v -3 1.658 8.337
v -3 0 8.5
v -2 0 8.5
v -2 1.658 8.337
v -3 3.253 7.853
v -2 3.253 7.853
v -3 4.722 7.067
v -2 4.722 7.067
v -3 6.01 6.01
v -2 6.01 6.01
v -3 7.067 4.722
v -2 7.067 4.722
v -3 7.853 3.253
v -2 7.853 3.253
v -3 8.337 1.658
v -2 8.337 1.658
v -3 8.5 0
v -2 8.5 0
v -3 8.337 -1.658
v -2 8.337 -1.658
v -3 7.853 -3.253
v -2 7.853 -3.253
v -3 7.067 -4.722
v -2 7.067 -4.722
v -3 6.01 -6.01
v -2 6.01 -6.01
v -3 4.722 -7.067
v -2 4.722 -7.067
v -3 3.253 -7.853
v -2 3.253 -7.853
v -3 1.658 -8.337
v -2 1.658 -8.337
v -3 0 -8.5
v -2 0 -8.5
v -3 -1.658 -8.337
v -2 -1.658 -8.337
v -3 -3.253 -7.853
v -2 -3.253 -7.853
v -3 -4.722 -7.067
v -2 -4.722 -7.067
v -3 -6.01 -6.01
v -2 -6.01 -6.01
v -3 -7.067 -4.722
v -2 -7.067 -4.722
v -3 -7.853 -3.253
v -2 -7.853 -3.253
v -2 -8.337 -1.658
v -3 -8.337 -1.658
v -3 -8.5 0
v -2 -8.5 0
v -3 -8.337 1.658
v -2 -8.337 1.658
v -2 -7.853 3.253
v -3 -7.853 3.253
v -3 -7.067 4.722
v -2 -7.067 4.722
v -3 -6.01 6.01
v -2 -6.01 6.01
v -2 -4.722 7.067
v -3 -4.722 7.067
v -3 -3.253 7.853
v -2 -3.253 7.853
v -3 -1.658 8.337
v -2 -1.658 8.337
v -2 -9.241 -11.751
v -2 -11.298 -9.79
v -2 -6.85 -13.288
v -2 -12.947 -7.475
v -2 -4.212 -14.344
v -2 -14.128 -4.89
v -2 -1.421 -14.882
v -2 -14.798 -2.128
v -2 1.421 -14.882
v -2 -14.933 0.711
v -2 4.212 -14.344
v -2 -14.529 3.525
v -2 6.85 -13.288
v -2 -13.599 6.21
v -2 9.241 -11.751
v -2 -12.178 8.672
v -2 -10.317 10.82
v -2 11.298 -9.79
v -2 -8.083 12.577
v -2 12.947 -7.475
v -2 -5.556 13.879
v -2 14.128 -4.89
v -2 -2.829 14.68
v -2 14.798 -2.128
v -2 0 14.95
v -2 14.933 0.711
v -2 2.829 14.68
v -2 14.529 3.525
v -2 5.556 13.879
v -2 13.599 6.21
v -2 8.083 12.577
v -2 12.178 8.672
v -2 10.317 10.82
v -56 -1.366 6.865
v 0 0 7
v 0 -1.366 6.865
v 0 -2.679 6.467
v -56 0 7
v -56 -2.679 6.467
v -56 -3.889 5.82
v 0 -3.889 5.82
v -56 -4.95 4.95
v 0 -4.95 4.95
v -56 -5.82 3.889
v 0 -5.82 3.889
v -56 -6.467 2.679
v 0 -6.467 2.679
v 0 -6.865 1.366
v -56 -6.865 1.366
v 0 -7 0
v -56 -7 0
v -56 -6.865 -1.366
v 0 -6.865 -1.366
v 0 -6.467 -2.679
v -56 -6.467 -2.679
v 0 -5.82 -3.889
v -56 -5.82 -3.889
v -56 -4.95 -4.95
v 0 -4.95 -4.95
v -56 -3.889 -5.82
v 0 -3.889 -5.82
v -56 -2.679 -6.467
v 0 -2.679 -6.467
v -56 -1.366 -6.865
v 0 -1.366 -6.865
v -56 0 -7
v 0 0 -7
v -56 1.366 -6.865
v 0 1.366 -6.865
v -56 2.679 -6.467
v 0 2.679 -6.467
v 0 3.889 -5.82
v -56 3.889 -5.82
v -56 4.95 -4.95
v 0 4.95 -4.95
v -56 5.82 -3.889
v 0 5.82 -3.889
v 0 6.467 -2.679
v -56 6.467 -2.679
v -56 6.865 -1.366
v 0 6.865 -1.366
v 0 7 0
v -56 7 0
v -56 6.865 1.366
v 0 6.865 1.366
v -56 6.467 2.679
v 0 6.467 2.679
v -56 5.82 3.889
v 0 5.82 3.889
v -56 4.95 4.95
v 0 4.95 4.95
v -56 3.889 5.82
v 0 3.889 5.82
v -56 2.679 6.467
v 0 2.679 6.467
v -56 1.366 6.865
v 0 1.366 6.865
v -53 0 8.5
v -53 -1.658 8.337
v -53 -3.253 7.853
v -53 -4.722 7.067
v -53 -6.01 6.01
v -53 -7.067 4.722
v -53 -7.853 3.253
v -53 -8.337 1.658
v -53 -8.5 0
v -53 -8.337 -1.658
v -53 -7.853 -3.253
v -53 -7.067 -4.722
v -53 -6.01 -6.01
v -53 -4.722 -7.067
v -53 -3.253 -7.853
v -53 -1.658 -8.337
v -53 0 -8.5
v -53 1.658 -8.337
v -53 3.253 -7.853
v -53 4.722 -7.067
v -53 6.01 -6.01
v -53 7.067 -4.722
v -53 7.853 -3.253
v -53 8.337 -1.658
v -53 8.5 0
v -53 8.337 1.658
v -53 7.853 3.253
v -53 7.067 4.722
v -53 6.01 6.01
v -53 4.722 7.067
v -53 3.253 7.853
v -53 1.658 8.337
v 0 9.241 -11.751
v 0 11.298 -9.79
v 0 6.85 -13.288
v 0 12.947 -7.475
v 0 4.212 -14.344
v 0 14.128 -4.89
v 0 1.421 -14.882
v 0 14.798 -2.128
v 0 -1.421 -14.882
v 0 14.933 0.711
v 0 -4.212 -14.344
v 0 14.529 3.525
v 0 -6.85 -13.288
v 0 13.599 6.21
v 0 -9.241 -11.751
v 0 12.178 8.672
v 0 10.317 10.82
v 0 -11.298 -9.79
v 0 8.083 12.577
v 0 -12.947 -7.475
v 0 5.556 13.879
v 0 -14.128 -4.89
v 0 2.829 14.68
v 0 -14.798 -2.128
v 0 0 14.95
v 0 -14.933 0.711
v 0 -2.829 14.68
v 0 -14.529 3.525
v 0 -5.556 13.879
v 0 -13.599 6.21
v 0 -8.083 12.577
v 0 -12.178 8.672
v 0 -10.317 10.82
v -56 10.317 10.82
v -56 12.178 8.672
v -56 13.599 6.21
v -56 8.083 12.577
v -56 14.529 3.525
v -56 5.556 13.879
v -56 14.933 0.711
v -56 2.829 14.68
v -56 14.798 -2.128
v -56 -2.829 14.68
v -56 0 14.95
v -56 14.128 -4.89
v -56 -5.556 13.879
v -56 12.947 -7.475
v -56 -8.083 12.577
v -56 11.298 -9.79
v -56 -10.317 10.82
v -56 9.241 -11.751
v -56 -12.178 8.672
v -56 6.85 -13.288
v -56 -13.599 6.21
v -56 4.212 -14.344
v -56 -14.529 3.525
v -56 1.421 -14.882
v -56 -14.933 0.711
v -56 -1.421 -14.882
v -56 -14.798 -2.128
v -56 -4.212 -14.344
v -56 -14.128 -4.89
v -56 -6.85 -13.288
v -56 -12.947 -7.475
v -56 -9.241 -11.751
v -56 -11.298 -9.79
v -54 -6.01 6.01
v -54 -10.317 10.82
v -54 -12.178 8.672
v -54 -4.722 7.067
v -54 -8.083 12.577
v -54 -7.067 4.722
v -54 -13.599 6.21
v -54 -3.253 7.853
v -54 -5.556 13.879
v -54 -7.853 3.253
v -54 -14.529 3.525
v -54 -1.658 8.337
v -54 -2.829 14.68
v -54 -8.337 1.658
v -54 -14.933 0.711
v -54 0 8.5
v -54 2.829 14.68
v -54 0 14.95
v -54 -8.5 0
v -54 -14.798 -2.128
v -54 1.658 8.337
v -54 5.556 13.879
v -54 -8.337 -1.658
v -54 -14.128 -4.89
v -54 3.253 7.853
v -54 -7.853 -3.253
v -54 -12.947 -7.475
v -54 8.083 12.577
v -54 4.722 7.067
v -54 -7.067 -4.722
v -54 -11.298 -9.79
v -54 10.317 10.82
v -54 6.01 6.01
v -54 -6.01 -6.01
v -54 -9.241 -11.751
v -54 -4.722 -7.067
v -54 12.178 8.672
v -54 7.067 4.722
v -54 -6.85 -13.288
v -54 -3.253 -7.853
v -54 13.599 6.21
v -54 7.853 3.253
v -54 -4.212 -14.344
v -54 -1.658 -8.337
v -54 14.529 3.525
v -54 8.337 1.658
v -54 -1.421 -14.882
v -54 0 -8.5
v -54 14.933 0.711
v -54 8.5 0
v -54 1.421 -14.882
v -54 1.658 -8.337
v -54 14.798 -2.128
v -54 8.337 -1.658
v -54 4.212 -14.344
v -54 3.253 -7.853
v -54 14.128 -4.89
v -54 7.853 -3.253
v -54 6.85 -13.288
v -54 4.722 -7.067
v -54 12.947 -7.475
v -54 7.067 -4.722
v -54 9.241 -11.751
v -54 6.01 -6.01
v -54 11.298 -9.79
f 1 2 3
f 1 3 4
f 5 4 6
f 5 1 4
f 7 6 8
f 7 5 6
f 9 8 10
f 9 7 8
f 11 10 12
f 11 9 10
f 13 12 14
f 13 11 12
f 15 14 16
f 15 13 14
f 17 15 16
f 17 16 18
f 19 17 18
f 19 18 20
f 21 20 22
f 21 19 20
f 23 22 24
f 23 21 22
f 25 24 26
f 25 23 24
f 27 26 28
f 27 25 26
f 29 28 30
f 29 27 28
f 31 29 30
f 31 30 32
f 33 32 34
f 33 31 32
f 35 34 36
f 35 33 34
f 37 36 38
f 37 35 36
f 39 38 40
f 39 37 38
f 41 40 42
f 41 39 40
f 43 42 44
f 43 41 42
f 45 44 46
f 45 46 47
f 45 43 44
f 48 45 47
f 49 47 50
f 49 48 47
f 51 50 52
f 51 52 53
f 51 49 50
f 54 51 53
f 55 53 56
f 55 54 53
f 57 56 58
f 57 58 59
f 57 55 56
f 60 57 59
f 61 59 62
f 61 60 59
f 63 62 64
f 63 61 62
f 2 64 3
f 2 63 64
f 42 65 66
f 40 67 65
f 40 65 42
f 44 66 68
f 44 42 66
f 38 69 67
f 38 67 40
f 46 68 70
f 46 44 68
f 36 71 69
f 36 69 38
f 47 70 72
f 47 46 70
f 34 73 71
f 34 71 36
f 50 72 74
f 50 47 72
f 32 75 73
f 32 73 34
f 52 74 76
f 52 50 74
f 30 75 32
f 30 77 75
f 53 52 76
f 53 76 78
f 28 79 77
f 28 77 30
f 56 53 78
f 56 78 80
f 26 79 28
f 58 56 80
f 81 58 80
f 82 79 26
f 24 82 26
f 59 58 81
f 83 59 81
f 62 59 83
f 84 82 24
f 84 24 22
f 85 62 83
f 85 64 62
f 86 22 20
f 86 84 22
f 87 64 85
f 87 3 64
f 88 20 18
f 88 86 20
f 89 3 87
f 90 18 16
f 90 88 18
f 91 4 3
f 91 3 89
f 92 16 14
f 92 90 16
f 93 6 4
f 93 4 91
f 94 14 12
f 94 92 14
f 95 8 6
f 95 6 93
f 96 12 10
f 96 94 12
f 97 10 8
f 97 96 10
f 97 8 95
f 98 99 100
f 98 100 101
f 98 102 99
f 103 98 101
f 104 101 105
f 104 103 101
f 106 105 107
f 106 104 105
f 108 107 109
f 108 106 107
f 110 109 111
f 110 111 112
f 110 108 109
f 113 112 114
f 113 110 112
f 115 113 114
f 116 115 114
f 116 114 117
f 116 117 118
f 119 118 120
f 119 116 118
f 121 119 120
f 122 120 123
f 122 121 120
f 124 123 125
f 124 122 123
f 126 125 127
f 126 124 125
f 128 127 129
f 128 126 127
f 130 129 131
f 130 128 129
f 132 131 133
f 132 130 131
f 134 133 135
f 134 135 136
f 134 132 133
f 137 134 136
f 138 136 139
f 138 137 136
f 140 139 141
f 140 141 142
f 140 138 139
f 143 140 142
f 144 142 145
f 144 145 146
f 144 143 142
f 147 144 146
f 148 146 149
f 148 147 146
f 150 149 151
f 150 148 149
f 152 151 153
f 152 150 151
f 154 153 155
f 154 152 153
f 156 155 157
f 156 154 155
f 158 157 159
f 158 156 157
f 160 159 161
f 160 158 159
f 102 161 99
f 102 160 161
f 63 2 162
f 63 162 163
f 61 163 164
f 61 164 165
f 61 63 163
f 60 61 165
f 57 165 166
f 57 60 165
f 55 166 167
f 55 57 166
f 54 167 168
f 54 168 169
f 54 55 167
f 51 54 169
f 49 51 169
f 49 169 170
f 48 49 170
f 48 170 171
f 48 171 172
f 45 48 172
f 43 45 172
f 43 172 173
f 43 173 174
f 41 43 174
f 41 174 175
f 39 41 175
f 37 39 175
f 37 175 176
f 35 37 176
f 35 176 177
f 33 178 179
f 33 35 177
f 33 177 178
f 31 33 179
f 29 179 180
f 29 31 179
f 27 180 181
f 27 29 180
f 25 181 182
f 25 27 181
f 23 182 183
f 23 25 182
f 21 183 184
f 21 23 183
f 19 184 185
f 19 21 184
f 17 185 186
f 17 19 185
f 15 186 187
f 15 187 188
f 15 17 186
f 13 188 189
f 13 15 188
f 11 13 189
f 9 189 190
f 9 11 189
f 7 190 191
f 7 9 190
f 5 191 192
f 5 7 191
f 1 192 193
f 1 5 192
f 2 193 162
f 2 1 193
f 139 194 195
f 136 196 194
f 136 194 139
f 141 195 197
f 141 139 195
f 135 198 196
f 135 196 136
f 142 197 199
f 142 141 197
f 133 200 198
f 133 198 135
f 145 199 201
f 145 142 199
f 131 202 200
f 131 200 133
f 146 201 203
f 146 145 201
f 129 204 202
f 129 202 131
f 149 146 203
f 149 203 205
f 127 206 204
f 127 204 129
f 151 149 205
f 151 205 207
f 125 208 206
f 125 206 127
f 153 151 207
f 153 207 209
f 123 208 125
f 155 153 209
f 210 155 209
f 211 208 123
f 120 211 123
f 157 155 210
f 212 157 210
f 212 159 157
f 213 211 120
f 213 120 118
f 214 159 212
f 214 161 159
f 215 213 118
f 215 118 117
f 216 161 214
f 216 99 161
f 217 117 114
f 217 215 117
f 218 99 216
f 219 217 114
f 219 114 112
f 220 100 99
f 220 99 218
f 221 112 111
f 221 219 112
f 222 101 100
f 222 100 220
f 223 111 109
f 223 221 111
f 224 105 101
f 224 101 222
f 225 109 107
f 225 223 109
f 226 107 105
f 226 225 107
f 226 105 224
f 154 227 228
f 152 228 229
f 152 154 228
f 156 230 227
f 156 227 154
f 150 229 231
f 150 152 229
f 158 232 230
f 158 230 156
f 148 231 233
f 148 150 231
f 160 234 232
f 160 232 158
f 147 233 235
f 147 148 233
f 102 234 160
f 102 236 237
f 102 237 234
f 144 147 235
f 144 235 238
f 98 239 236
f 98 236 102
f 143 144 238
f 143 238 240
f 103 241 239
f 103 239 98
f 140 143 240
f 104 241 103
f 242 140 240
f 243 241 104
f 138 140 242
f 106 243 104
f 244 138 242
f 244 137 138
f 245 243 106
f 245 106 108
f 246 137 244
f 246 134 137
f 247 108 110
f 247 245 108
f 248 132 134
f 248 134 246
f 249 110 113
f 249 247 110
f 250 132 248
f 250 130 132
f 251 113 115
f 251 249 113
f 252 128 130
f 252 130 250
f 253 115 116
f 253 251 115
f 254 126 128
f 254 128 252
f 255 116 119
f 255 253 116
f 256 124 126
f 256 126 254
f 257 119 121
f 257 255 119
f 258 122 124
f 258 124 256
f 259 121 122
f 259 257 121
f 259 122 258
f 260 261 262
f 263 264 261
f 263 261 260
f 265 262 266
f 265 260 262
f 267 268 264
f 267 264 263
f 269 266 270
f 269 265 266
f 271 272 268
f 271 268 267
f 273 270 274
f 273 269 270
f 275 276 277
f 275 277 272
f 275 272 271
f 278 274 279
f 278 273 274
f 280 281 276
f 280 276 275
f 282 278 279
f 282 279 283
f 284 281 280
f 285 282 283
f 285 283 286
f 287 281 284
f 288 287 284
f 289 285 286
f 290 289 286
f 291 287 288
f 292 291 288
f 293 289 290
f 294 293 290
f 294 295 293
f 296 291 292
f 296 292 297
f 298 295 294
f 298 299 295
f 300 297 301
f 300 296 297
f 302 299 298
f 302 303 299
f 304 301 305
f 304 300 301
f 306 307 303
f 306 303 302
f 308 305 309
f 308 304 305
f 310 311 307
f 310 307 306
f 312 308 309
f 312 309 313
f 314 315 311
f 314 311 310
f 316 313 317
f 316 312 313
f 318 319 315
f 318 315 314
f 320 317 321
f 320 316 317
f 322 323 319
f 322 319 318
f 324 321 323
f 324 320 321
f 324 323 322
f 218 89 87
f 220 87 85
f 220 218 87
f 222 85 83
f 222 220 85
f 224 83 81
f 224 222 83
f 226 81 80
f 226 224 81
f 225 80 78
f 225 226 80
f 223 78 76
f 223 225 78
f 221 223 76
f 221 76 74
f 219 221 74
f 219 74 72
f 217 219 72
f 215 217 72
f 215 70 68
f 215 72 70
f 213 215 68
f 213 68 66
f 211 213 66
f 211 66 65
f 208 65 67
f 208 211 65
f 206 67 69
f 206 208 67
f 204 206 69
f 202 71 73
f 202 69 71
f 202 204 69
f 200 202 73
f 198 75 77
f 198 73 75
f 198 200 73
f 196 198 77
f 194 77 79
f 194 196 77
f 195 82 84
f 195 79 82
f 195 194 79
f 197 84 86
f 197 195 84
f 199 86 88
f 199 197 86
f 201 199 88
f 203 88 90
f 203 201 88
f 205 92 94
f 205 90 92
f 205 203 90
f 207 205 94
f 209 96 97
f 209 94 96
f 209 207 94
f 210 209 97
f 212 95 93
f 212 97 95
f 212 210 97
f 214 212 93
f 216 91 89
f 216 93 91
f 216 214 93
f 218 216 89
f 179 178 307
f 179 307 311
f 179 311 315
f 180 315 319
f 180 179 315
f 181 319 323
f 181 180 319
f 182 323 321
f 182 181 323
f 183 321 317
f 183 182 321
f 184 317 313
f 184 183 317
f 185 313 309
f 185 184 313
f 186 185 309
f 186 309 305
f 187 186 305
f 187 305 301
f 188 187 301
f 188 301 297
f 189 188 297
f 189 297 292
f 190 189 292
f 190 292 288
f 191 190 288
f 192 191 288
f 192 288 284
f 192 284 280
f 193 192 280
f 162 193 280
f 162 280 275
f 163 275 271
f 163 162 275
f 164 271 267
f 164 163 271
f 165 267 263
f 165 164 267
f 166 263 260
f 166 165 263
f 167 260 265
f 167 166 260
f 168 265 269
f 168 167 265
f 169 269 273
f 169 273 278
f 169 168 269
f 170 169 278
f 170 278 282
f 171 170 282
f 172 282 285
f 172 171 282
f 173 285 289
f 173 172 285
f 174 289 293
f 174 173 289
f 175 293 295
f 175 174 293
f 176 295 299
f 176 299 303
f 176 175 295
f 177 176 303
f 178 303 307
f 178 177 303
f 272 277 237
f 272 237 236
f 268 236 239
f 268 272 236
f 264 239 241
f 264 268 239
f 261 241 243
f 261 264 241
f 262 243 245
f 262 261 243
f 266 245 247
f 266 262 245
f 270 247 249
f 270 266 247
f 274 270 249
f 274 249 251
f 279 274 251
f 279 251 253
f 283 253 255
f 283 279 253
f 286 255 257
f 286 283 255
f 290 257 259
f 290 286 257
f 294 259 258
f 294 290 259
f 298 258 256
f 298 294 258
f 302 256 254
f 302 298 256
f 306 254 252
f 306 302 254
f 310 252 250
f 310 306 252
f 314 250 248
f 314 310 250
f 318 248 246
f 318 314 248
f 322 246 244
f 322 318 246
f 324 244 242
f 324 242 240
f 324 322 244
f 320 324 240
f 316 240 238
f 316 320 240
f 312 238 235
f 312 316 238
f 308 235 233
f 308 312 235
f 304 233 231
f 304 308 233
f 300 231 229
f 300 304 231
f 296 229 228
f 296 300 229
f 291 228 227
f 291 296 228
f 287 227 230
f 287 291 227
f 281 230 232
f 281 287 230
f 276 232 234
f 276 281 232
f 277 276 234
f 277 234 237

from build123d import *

# Parameters (mm, degrees)
ESBO_O2_R             = 14.95
ESBO_O2_R_2           = 8.5
CORTE_EXTRUS_O1_DEPTH = 1
ESBO_O3_R             = 14.95
ESBO_O3_R_2           = 8.5
CORTE_EXTRUS_O2_DEPTH = 1


with BuildPart() as part:
    # Esboço1 → Revolução1 (revolve)
    with BuildSketch(Plane(origin=(0, 0, 0), x_dir=(1, 0, 0), z_dir=(0, 1, 0))):
        Polygon((-56, -7), (-56, -14.95), (-53, -14.95), (-53, -8.5), (-3, -8.5), (-3, -14.95), (0, -14.95), (0, -7), align=None)
    revolve(axis=Axis((-102.959505757, 0, 0), (1, 0, 0)))

    # Esboço2 → Corte-extrusão1 (cut)
    with BuildSketch(Plane(origin=(-53, 0, 0), x_dir=(0, 0, -1), z_dir=(1, 0, 0))):
        Circle(ESBO_O2_R)
        Circle(ESBO_O2_R_2, mode=Mode.SUBTRACT)
    extrude(amount=-CORTE_EXTRUS_O1_DEPTH, mode=Mode.SUBTRACT)

    # Esboço3 → Corte-extrusão2 (cut)
    with BuildSketch(Plane.ZY.offset(3)):
        Circle(ESBO_O3_R)
        Circle(ESBO_O3_R_2, mode=Mode.SUBTRACT)
    extrude(amount=-CORTE_EXTRUS_O2_DEPTH, mode=Mode.SUBTRACT)


solid = part.part
